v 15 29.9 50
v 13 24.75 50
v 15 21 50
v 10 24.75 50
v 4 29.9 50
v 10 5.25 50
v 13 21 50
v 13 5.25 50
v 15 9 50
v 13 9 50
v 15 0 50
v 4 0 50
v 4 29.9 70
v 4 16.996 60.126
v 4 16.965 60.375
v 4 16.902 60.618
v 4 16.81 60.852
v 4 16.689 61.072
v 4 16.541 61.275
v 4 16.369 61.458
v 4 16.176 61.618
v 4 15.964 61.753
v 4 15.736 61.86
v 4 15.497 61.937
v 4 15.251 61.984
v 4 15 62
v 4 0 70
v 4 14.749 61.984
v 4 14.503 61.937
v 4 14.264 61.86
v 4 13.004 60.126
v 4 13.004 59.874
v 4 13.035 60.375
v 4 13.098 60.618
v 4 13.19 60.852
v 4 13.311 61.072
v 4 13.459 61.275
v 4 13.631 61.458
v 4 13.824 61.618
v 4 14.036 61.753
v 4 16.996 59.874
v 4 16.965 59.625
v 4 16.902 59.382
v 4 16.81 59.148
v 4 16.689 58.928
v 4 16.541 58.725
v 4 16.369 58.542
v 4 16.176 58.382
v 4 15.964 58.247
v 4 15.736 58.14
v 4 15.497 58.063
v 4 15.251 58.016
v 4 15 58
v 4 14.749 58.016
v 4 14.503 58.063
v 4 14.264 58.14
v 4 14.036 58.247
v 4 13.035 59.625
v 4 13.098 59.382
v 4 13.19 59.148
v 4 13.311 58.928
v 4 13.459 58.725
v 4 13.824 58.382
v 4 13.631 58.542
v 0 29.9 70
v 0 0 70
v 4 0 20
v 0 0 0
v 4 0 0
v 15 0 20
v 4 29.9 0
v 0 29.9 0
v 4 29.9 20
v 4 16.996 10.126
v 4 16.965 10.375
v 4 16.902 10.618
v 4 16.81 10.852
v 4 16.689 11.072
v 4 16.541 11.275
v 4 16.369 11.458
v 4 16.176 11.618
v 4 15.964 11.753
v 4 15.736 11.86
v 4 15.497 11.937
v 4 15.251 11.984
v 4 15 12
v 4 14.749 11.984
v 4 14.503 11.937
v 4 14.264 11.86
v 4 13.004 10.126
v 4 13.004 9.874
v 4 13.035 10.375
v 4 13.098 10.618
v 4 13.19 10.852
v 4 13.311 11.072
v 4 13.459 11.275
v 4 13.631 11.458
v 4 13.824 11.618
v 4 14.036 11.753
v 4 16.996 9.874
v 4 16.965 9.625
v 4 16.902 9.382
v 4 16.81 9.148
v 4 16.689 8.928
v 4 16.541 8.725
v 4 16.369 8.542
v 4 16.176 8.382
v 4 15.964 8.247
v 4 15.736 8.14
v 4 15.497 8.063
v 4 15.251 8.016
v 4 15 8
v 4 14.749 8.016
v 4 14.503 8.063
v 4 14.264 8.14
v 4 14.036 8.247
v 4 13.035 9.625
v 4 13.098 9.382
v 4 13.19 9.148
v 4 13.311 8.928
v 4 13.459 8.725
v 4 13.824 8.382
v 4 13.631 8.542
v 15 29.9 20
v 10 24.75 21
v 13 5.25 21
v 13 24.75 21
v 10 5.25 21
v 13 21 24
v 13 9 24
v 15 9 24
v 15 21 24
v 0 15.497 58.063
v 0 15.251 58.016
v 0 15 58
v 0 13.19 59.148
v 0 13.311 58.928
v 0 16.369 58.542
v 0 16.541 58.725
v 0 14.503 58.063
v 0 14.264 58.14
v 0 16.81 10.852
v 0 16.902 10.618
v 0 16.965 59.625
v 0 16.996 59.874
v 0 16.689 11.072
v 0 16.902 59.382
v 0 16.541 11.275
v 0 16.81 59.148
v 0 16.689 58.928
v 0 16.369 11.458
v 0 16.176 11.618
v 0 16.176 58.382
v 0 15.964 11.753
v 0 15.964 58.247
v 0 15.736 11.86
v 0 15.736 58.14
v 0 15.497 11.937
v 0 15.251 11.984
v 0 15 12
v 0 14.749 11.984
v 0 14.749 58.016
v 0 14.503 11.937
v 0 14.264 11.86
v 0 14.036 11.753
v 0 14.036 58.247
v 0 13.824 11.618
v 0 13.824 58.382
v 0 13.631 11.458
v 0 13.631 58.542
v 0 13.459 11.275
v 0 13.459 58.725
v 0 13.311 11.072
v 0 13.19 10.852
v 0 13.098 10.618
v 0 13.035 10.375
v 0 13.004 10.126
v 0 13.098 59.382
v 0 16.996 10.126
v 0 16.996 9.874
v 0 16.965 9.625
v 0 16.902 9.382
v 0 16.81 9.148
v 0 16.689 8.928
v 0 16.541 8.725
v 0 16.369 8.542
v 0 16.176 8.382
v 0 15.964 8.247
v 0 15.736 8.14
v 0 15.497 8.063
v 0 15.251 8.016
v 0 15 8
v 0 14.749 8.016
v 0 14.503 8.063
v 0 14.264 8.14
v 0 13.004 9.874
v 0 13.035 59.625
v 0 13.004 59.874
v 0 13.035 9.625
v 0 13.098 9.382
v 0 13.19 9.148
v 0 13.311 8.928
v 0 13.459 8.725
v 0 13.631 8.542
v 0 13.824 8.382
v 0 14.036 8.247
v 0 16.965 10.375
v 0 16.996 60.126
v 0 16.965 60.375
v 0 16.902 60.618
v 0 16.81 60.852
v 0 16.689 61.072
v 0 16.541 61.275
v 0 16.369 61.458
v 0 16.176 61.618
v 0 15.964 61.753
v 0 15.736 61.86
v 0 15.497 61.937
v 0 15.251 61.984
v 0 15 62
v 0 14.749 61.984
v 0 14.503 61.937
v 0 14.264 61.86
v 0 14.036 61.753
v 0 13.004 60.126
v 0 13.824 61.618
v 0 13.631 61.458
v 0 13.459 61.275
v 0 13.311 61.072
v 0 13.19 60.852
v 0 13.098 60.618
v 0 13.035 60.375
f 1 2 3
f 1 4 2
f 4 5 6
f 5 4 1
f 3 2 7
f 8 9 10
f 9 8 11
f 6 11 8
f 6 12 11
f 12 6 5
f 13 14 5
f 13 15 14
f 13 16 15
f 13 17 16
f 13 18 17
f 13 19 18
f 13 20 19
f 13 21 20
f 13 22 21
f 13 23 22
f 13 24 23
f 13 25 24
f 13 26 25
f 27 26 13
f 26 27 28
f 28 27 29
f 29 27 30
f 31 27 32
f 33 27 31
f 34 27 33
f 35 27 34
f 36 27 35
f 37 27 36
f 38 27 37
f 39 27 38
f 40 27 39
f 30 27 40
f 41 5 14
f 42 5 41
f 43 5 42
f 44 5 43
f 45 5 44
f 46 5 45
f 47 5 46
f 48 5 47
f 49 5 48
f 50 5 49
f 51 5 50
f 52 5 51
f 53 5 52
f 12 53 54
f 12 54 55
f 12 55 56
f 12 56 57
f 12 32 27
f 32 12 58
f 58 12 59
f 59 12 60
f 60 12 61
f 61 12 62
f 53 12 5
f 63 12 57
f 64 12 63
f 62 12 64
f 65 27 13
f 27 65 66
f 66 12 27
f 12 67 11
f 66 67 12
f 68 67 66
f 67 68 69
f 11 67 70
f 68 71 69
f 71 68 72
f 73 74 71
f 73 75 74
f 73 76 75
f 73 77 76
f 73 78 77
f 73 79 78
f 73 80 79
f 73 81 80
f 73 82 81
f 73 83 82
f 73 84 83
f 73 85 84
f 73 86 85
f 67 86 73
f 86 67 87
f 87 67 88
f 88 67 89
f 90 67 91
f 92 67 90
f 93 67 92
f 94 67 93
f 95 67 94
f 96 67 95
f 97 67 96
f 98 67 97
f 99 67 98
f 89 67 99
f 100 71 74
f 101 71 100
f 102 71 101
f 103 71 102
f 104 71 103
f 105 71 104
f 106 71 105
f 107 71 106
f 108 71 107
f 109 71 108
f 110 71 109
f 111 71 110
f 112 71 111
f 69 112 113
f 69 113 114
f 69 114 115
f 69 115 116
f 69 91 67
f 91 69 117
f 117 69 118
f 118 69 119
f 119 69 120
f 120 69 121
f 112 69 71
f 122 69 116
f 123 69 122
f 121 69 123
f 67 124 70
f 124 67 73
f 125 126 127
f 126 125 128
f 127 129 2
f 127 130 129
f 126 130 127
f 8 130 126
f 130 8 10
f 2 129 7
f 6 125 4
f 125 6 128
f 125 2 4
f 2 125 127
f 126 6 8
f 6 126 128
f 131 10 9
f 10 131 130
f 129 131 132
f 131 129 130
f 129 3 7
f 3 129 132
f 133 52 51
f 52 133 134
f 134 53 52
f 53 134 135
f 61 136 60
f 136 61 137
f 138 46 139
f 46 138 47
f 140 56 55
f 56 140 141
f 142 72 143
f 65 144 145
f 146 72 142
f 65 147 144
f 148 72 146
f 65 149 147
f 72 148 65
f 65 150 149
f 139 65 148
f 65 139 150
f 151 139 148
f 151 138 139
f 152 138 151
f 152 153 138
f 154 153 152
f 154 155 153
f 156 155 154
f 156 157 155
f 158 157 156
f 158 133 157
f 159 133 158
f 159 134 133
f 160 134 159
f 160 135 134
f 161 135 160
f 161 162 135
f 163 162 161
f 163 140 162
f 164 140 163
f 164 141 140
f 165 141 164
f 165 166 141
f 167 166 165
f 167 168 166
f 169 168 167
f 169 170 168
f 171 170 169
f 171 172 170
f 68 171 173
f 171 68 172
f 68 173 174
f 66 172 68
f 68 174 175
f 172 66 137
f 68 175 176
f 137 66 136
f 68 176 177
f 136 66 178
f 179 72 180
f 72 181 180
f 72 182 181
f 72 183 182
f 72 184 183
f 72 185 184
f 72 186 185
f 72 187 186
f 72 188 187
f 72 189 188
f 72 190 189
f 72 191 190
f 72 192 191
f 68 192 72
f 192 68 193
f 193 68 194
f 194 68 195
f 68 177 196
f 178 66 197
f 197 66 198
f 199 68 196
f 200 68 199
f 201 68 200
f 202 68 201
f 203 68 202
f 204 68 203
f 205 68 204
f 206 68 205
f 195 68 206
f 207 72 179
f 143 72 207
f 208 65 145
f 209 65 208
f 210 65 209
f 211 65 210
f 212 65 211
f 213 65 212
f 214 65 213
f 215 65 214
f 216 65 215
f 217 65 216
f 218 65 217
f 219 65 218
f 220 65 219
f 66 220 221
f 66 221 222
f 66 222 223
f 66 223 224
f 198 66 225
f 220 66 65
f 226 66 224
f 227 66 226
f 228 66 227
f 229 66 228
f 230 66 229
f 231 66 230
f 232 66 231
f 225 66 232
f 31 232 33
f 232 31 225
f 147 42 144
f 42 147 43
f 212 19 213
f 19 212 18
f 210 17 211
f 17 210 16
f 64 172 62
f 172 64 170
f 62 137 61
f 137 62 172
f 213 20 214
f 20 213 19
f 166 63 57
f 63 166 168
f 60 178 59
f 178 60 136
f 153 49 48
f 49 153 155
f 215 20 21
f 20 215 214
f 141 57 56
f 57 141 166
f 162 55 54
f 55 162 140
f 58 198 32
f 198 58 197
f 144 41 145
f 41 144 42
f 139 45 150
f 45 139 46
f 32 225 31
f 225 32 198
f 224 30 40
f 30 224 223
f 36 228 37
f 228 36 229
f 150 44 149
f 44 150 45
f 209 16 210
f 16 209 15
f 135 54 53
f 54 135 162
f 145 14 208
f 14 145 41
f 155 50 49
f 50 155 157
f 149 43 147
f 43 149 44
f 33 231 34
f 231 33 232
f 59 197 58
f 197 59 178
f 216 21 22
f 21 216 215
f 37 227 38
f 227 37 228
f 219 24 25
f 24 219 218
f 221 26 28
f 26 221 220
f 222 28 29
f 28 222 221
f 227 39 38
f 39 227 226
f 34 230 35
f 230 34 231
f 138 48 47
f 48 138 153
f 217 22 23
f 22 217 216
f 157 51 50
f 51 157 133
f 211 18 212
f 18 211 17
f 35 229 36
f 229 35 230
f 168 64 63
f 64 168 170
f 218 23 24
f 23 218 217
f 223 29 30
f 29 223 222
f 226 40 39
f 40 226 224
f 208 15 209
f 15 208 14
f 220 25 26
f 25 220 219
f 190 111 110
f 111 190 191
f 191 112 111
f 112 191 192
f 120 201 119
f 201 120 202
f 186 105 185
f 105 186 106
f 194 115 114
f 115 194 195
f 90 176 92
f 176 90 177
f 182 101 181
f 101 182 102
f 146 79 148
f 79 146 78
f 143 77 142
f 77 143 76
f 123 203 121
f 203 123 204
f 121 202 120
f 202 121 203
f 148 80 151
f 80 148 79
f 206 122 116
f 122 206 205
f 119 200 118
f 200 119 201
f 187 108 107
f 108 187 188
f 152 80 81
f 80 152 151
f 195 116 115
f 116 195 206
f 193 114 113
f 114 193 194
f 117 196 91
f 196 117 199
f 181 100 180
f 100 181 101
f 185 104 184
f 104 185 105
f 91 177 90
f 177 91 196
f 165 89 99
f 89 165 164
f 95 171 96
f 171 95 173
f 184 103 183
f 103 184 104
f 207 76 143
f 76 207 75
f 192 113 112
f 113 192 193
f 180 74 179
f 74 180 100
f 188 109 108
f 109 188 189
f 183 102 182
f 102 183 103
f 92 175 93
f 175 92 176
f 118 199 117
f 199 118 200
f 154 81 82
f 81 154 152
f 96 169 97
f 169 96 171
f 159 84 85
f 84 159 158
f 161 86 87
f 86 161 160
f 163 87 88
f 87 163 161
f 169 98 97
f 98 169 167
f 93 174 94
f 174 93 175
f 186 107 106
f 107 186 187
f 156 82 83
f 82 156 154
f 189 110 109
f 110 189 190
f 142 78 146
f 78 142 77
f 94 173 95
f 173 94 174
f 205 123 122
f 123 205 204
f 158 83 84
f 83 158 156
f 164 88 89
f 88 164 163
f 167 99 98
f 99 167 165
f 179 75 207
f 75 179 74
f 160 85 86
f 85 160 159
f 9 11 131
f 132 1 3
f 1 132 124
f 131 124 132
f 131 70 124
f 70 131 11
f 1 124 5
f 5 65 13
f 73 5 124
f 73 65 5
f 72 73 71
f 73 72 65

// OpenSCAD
xwidth_slider=70; // [40:80]
xdepth_slider=30; // [22:40]
xheight_slider=15; // [10:60
plategap=19.5;

xwidth=xwidth_slider;
xdepth=xdepth_slider;
xheight=xheight_slider;

 translate([0,0,xwidth]){
 rotate([0,90,0]){
difference(){
// main body    
cube([xwidth,xdepth-0.1,xheight]){};
union(){
    // left
    translate([0,0,4]){
        cube([(xwidth-30)/2,xdepth,xheight]){};
    }
    // right
    translate([xwidth-((xwidth-30)/2),0,4]){
        cube([(xwidth-30)/2,xdepth,xheight]){};
    }
    // center bottom gap
    translate([9,(xdepth/2)-(plategap/2),xheight-5]){
            cube([xwidth-30,plategap,3]){};
    }
    // center top gap
    translate([(xwidth/2)+11,(xdepth/2)-6,xheight-3]){
        rotate([0,0,90]){
            cube([12,xdepth-4,10]){};
        }
    }  
    // left bolt hole
    translate([((xwidth-30)/2)/2,xdepth/2,0]){
        cylinder(h=xheight, r=2, $fn=50);
    }
    //right bolt hole
    translate([xwidth-(((xwidth-30)/2)/2),xdepth/2,0]){
        cylinder(h=xheight, r=2, $fn=50);
    }
};
};
};
};
